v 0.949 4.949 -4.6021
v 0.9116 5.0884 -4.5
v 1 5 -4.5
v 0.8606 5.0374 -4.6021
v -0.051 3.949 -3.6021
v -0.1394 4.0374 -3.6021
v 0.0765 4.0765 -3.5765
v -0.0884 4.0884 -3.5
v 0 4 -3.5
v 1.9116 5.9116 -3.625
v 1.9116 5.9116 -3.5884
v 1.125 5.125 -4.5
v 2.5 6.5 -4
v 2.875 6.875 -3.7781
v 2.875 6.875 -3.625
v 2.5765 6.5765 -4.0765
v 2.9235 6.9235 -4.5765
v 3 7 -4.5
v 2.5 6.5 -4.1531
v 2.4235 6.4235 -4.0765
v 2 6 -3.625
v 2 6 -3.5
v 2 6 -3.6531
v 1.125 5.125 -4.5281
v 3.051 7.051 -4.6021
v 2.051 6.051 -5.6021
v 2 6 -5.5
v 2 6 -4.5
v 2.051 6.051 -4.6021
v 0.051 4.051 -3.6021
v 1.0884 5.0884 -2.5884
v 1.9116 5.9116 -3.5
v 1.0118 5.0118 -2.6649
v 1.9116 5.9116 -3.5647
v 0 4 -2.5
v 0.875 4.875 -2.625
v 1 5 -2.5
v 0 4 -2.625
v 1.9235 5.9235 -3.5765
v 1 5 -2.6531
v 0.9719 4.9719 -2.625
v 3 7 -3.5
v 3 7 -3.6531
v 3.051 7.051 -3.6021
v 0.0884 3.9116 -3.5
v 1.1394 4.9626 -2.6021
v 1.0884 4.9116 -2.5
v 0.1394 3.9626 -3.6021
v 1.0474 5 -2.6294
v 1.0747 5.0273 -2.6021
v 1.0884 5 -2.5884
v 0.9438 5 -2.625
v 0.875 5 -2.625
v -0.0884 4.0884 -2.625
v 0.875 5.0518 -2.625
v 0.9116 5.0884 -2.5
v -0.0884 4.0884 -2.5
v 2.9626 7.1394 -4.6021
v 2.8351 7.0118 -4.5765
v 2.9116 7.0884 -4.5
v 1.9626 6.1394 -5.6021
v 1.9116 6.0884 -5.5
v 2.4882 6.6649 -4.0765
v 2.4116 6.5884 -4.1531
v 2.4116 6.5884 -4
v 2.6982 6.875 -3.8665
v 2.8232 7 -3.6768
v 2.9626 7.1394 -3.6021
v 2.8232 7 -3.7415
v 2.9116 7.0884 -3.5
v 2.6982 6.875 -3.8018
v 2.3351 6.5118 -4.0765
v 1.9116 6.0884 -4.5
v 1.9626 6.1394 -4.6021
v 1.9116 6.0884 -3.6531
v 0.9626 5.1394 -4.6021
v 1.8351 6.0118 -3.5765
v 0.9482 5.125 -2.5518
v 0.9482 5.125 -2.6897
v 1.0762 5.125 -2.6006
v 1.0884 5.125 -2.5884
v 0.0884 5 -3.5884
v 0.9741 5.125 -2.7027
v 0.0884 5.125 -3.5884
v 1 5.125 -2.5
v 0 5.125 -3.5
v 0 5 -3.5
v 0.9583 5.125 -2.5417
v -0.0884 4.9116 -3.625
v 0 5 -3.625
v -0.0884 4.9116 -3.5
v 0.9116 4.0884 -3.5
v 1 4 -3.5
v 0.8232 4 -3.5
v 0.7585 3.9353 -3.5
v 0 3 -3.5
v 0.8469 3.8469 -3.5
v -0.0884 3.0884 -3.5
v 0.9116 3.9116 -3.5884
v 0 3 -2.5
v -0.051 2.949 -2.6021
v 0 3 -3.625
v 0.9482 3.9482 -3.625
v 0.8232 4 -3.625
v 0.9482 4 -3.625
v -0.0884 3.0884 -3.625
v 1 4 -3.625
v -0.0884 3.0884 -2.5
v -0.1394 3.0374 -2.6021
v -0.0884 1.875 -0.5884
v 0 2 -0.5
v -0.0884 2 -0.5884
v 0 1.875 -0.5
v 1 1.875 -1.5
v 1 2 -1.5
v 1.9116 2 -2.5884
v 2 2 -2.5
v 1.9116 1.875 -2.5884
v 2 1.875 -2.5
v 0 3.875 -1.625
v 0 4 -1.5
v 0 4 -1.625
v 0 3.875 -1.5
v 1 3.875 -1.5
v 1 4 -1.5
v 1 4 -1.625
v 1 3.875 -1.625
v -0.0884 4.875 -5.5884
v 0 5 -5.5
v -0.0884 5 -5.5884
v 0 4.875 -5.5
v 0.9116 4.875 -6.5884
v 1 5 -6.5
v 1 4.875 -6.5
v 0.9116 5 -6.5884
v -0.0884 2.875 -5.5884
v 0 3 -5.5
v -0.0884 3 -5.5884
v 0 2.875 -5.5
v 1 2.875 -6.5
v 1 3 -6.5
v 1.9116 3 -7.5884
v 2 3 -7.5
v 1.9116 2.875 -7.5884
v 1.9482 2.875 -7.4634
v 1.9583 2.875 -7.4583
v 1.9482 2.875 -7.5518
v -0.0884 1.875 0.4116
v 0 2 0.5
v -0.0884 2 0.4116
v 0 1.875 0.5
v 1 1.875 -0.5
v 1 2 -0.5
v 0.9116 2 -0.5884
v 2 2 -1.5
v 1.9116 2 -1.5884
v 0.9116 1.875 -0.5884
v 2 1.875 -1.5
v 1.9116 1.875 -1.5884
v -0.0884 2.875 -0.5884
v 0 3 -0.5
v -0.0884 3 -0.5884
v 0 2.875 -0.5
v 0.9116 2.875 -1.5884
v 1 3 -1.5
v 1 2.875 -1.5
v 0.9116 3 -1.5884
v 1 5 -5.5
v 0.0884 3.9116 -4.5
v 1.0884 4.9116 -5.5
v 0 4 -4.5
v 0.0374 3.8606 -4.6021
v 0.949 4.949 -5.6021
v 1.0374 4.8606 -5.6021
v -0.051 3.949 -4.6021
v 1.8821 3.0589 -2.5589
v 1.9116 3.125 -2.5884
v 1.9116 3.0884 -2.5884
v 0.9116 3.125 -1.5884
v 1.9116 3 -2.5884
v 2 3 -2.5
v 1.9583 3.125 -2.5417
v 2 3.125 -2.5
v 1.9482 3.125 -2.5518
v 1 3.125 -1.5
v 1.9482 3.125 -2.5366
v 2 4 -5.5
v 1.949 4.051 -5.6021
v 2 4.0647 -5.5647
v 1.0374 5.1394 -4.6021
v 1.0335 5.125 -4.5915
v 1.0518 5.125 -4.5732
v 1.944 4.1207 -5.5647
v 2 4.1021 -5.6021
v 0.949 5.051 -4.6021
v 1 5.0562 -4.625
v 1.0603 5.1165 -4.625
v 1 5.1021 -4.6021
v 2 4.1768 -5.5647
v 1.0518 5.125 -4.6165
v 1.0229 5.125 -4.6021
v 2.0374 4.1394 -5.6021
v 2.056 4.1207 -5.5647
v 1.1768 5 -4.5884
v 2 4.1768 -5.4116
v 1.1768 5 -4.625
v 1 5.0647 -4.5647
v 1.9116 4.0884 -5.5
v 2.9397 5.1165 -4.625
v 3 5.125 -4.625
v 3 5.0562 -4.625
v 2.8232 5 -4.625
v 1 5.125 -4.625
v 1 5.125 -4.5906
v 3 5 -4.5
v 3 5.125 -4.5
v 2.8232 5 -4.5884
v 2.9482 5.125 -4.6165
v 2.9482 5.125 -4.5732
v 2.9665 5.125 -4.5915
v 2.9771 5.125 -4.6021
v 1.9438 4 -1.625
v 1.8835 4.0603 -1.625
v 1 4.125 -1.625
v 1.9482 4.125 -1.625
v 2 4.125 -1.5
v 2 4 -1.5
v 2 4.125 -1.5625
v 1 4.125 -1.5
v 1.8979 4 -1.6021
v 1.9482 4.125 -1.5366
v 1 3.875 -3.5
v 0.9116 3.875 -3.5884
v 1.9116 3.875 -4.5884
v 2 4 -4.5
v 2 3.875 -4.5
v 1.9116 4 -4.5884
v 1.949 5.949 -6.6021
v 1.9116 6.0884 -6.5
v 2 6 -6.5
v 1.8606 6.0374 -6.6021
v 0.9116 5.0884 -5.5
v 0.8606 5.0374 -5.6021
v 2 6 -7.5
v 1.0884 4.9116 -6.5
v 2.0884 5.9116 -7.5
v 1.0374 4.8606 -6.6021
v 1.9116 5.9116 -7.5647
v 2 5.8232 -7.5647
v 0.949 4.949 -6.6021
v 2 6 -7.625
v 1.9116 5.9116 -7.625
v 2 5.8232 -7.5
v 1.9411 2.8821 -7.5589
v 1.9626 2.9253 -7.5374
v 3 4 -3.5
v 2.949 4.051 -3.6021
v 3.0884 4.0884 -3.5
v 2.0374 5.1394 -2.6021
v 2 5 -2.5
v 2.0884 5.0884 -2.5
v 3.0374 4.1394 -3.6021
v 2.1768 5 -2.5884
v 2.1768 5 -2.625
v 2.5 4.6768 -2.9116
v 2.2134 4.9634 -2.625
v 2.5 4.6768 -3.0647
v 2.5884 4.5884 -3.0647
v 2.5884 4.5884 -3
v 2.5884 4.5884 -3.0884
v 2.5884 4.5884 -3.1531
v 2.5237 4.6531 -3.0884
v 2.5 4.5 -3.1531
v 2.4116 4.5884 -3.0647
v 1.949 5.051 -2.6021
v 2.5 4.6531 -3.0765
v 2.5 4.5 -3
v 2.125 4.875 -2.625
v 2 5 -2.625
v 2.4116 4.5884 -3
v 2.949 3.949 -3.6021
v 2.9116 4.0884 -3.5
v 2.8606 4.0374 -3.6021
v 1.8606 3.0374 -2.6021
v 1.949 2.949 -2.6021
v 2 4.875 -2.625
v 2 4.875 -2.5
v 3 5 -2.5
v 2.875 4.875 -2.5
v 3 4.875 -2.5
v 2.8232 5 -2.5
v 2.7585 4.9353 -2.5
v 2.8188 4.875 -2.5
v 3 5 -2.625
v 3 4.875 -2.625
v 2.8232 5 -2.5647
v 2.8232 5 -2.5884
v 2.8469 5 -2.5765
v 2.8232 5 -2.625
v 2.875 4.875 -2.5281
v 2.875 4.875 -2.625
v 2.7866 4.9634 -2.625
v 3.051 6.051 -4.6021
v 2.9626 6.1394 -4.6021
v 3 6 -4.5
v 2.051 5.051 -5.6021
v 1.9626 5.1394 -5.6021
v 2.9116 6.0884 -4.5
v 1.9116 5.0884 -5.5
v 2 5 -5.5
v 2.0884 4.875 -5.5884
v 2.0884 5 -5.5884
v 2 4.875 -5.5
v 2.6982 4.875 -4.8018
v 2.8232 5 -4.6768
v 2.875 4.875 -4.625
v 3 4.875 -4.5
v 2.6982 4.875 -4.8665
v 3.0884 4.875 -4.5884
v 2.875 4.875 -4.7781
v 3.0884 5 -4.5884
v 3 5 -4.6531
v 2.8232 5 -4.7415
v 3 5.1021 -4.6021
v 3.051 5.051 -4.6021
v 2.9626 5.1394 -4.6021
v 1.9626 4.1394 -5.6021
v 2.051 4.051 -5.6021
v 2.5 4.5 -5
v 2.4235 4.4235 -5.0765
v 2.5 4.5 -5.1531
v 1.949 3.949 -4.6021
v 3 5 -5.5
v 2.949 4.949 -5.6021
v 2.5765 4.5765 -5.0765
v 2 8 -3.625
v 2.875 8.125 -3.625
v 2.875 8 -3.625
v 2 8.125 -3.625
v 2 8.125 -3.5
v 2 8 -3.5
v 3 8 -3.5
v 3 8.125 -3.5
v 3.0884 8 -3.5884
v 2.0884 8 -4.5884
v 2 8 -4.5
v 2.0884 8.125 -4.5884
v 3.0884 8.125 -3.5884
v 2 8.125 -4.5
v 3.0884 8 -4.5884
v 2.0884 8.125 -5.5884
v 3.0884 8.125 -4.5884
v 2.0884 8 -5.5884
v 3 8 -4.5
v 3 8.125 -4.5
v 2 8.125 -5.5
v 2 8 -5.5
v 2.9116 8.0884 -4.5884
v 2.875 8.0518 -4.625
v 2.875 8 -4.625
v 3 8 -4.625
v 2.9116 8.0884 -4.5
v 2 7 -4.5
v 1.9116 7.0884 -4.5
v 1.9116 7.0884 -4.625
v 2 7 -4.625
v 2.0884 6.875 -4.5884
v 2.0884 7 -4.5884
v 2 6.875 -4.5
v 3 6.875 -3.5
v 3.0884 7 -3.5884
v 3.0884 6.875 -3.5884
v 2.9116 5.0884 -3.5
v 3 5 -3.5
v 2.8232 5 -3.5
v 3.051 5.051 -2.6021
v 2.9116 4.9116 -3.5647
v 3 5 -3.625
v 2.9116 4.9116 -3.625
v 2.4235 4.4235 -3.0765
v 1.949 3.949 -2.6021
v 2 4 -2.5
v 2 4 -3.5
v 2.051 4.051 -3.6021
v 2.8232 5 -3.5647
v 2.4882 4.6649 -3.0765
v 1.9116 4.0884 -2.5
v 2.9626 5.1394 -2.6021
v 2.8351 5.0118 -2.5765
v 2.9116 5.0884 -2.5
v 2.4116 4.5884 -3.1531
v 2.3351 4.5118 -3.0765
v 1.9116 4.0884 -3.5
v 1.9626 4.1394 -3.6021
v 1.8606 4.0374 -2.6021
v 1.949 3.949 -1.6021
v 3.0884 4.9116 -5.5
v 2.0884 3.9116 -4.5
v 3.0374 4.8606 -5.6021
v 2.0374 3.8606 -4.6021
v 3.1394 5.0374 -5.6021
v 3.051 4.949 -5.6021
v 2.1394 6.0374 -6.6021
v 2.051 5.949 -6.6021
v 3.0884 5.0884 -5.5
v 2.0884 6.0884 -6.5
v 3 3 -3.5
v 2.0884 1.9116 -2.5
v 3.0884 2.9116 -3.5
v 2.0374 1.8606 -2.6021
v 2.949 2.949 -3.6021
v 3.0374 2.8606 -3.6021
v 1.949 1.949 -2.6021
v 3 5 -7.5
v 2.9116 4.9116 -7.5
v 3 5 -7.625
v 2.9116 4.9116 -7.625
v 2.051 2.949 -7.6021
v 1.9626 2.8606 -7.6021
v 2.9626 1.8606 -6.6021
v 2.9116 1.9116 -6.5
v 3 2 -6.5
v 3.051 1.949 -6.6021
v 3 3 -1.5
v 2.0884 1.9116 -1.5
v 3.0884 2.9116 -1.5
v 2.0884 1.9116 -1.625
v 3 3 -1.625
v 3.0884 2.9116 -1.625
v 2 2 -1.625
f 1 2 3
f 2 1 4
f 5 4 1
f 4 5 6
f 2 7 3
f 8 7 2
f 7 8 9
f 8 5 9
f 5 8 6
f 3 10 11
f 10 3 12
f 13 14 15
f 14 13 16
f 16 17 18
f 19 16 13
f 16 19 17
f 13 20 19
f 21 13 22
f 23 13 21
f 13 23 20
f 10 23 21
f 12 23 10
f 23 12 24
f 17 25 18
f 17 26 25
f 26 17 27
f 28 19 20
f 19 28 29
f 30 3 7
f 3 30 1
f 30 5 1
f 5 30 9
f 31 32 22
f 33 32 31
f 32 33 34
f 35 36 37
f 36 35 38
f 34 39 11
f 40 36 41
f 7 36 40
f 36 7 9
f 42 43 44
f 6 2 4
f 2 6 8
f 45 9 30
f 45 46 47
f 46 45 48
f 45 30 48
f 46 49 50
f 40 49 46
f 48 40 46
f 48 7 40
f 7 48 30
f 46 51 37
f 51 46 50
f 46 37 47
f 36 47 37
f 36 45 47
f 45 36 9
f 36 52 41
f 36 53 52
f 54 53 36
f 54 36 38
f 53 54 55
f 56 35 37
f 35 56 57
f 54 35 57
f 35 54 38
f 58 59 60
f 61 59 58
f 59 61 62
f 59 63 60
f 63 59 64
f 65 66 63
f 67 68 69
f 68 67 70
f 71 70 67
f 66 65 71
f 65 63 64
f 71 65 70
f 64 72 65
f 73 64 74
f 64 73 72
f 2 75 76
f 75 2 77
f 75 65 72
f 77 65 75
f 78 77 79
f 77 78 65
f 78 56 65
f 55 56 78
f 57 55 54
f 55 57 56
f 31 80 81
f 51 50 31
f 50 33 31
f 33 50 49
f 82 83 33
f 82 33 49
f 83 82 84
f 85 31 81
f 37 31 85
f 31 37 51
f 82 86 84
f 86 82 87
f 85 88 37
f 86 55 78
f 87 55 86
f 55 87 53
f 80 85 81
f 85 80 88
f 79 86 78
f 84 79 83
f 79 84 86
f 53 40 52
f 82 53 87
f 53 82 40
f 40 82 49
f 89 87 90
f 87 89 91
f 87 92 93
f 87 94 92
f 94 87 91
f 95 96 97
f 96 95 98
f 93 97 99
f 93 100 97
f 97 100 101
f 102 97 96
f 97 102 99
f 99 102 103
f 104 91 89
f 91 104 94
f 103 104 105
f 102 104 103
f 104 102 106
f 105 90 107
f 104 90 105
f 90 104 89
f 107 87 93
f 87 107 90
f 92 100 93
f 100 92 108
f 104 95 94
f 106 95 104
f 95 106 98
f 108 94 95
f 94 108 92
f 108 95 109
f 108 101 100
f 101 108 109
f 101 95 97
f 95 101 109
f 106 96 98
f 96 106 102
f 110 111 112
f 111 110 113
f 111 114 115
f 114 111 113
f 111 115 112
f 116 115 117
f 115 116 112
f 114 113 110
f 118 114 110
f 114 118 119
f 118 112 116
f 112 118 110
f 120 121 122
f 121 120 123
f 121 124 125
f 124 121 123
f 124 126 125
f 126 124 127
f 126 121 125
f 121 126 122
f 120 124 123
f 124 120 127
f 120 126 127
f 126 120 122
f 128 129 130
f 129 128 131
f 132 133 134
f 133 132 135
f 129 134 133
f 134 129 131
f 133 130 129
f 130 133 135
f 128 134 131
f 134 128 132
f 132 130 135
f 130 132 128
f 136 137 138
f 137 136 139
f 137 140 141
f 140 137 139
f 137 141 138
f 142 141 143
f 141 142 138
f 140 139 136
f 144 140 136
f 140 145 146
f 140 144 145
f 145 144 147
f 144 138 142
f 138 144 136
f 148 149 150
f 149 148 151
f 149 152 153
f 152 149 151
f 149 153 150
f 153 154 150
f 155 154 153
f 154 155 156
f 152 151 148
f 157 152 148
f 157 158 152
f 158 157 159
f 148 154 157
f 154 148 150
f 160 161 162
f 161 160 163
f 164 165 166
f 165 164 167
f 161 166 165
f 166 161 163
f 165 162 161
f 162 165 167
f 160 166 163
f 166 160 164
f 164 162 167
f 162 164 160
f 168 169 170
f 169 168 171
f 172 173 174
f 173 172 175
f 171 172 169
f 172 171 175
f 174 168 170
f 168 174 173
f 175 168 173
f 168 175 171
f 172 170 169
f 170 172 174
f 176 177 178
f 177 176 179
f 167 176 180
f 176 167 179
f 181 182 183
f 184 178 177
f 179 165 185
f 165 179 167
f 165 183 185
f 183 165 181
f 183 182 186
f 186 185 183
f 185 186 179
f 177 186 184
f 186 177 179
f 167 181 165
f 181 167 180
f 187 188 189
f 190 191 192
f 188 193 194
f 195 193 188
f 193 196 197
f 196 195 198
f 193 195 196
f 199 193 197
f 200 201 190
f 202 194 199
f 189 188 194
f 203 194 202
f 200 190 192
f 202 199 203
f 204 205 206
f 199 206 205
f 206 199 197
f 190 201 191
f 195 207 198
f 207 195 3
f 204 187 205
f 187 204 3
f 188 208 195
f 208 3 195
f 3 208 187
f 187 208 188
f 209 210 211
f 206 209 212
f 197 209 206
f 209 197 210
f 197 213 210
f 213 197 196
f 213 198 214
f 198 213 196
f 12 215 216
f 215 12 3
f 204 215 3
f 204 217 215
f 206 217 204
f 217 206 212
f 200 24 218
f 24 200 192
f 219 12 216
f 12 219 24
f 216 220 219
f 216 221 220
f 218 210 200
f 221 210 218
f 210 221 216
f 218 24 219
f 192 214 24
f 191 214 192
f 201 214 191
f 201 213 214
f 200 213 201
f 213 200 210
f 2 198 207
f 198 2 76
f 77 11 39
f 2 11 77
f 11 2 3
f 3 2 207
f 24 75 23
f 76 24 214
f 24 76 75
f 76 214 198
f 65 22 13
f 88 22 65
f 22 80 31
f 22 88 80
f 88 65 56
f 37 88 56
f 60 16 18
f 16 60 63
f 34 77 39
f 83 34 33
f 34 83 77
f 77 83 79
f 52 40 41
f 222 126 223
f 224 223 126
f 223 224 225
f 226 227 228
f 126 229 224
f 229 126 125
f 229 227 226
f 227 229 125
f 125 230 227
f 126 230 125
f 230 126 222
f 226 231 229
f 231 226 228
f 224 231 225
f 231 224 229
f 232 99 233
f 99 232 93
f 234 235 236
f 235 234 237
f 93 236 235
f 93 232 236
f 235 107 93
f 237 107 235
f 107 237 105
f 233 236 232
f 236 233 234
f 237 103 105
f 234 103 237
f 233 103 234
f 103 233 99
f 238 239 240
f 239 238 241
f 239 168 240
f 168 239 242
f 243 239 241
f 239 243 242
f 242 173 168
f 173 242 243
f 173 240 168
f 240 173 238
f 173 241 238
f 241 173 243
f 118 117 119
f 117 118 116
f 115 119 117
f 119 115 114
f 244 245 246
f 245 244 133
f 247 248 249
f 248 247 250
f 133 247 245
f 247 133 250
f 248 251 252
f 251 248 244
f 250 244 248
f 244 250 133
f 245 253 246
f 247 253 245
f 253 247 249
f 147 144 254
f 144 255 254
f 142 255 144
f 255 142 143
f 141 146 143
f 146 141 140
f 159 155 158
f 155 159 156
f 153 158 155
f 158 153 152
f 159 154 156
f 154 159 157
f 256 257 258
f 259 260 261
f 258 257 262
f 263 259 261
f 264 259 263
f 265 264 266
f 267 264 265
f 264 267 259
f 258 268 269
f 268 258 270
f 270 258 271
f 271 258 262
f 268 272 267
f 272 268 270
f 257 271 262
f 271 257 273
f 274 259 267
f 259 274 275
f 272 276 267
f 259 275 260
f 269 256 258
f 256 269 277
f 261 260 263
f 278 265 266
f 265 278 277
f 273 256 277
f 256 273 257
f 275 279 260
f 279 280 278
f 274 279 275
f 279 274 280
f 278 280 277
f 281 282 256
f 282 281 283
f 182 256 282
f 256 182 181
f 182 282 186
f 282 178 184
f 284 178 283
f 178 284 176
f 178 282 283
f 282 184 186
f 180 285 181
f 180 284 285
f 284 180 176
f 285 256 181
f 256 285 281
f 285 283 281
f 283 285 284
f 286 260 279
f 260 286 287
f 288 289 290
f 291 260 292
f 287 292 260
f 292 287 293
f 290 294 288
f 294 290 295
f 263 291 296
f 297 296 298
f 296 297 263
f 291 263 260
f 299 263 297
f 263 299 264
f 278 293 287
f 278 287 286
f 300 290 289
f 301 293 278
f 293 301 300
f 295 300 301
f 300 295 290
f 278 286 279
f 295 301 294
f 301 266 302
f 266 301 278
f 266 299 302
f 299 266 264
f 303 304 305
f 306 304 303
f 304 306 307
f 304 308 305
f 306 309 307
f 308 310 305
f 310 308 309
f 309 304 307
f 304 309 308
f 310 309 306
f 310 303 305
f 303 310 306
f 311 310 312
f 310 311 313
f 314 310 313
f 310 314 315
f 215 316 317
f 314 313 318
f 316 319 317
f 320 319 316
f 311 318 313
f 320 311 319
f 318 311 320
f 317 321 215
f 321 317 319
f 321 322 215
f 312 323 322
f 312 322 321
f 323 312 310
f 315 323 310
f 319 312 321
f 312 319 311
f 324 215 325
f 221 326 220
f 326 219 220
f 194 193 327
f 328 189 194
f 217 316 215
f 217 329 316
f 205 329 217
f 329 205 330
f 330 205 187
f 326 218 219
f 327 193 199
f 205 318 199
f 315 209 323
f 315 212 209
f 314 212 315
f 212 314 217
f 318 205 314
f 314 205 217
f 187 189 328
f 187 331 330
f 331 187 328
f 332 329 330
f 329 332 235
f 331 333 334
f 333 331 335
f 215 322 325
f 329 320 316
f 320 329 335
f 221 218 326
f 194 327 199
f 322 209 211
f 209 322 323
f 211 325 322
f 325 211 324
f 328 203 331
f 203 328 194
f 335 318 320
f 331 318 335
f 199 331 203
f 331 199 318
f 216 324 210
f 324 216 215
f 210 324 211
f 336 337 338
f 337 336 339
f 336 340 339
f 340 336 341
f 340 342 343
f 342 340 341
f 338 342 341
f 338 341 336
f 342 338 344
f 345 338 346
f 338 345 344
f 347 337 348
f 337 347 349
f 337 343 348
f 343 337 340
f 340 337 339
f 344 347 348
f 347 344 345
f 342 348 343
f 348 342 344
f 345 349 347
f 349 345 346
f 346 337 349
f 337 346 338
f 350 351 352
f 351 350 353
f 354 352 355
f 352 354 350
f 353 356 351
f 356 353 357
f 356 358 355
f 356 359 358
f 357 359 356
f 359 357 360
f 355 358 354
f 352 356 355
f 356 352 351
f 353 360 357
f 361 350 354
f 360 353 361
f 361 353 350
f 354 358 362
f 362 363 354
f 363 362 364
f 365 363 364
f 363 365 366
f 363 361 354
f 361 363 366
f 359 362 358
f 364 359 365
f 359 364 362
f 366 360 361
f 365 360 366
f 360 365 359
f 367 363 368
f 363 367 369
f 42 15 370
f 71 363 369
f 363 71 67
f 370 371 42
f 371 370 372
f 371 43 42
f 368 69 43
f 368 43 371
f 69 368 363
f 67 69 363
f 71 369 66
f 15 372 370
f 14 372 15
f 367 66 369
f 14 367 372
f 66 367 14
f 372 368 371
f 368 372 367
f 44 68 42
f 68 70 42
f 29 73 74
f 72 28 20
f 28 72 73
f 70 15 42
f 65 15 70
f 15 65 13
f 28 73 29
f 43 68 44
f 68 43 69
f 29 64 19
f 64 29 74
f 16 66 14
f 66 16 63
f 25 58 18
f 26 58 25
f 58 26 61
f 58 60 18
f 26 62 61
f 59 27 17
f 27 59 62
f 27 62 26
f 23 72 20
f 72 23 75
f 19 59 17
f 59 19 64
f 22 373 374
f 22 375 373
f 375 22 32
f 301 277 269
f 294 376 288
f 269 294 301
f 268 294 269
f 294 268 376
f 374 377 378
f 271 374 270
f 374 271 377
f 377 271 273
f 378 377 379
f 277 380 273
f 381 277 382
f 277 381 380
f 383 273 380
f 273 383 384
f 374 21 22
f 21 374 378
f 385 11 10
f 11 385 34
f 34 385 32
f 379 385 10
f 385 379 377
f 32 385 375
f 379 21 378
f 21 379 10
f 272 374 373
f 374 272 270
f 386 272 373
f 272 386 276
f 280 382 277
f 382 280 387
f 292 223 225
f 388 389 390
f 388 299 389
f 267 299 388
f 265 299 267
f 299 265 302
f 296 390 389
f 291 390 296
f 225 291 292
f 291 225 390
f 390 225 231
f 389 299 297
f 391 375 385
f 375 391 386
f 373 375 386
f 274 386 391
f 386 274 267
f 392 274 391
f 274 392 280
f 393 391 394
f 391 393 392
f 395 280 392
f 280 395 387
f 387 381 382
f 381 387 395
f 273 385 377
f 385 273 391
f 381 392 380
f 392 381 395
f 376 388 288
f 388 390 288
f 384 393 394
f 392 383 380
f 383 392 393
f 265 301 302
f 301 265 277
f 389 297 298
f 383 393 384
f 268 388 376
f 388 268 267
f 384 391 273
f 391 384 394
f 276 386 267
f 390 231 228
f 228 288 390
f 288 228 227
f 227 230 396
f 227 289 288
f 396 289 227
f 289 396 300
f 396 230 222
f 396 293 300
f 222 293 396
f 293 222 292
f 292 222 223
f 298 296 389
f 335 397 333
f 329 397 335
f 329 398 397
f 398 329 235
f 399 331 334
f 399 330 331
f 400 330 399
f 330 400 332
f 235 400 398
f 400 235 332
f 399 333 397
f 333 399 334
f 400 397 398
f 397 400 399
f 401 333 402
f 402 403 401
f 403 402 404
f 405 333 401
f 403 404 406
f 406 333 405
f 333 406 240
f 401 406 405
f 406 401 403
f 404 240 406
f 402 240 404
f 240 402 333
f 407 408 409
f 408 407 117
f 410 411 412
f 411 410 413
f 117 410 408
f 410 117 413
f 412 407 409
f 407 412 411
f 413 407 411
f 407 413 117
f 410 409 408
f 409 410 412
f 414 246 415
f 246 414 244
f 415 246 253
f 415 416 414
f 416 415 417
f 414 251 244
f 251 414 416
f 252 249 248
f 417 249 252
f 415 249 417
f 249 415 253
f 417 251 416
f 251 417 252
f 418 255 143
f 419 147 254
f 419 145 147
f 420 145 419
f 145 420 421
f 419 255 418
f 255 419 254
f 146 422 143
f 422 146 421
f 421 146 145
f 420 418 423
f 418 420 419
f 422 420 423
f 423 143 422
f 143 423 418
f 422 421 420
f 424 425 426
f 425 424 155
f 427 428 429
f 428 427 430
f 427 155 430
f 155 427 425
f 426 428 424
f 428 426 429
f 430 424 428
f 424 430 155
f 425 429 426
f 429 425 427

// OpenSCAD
translate(v = [-0.5, -0.5, 0]) {
	/*Shell 0*/
	union() {
		%/*Nodes shell 0*/
		union() {
			/*Node $_137*/
			color(alpha = 0.1, c = "orange") {
				translate(v = [0, 4, -4]) {
					cube(size = [1, 1, 1]);
				}
			}
			/*Node $_23*/
			color(alpha = 0.1, c = "orange") {
				translate(v = [0, 4, -3]) {
					cube(size = [1, 1, 1]);
				}
			}
			/*Node $_138*/
			color(alpha = 0.1, c = "pink") {
				translate(v = [0, 5, -4]) {
					cube(size = [1, 1, 1]);
				}
			}
			/*Node $_19*/
			color(alpha = 0.1, c = "yellow") {
				translate(v = [0, 3, -3]) {
					cube(size = [1, 1, 1]);
				}
			}
			/*Node $_41*/
			color(alpha = 0.1, c = "pink") {
				translate(v = [0, 3, -4]) {
					cube(size = [1, 1, 1]);
				}
			}
			/*Node $_37__0*/
			color(alpha = 0.1, c = "lightblue") {
				translate(v = [0, 2, -1]) {
					cube(size = [1, 1, 1]);
				}
			}
			/*Node $_39__0*/
			color(alpha = 0.1, c = "lightblue") {
				translate(v = [0, 4, -2]) {
					cube(size = [1, 1, 1]);
				}
			}
			/*Node $_42__0*/
			color(alpha = 0.1, c = "lightblue") {
				translate(v = [0, 5, -6]) {
					cube(size = [1, 1, 1]);
				}
			}
			/*Node $_36__0*/
			color(alpha = 0.1, c = "lightblue") {
				translate(v = [0, 3, -6]) {
					cube(size = [1, 1, 1]);
				}
			}
			/*Node $_40__0*/
			color(alpha = 0.1, c = "lightblue") {
				translate(v = [0, 2, 0]) {
					cube(size = [1, 1, 1]);
				}
			}
			/*Node $_38__0*/
			color(alpha = 0.1, c = "lightblue") {
				translate(v = [0, 3, -1]) {
					cube(size = [1, 1, 1]);
				}
			}
			/*Node $_43__0*/
			color(alpha = 0.1, c = "lightblue") {
				translate(v = [0, 4, -5]) {
					cube(size = [1, 1, 1]);
				}
			}
		}
		/*Edges shell 0*/
		union() {
			/*Edge 137 from thing.chamber[3].thingy.v8 to $_137*/
			translate(v = [0.5, 4.5, -3.5]) {
				rotate(a = [0, 125.26438968275465, 45.0]) {
					cube(size = [0.125, 0.125, 1.7320508075688772]);
				}
			}
			/*Edge 137 from $_137 to thing.chamber[3].thingy.v9*/
			translate(v = [1.5, 5.5, -2.5]) {
				rotate(a = [0, 125.26438968275465, -135.0]) {
					cube(size = [0.125, 0.125, 1.7320508075688772]);
				}
			}
			/*Edge 23 from thing.chamber[3].thingy.v9 to $_23*/
			translate(v = [0.5, 4.5, -2.5]) {
				rotate(a = [0, 90.0, 45.0]) {
					cube(size = [0.125, 0.125, 1.4142135623730951]);
				}
			}
			/*Edge 138 from thing.chamber[3].thingy.v9 to $_138*/
			translate(v = [0.5, 5.5, -3.5]) {
				rotate(a = [0, 45.00000000000001, 0.0]) {
					cube(size = [0.125, 0.125, 1.4142135623730951]);
				}
			}
			/*Edge 138 from $_138 to thing.dead_bead*/
			translate(v = [1.5, 4.5, -3.5]) {
				rotate(a = [0, 90.0, 135.0]) {
					cube(size = [0.125, 0.125, 1.4142135623730951]);
				}
			}
			/*Edge 19 from thing.dead_bead to $_19*/
			translate(v = [0.5, 3.5, -2.5]) {
				rotate(a = [0, 125.26438968275465, 45.0]) {
					cube(size = [0.125, 0.125, 1.7320508075688772]);
				}
			}
			/*Edge 41 from thing.dead_bead to $_41*/
			translate(v = [0.5, 3.5, -3.5]) {
				rotate(a = [0, 90.0, 45.0]) {
					cube(size = [0.125, 0.125, 1.4142135623730951]);
				}
			}
			/*Edge -1 from $_37__0 to $_37__1*/
			translate(v = [1.5, 2.5, -1.5]) {
				rotate(a = [0, 45.00000000000001, 180.0]) {
					cube(size = [0.125, 0.125, 1.4142135623730951]);
				}
			}
			/*Edge -1 from $_39__0 to $_39__1*/
			translate(v = [1.5, 4.5, -1.5]) {
				rotate(a = [0, 90.0, 180.0]) {
					cube(size = [0.125, 0.125, 1.0]);
				}
			}
			/*Edge -1 from $_42__0 to $_42__1*/
			translate(v = [1.5, 5.5, -6.5]) {
				rotate(a = [0, 45.00000000000001, 180.0]) {
					cube(size = [0.125, 0.125, 1.4142135623730951]);
				}
			}
			/*Edge -1 from $_36__0 to $_36__1*/
			translate(v = [1.5, 3.5, -6.5]) {
				rotate(a = [0, 45.00000000000001, 180.0]) {
					cube(size = [0.125, 0.125, 1.4142135623730951]);
				}
			}
			/*Edge -1 from $_40__0 to $_40__1*/
			translate(v = [1.5, 2.5, -0.5]) {
				rotate(a = [0, 45.00000000000001, 180.0]) {
					cube(size = [0.125, 0.125, 1.4142135623730951]);
				}
			}
			/*Edge -1 from $_38__0 to $_38__1*/
			translate(v = [1.5, 3.5, -1.5]) {
				rotate(a = [0, 45.00000000000001, 180.0]) {
					cube(size = [0.125, 0.125, 1.4142135623730951]);
				}
			}
			/*Edge -1 from $_43__0 to $_43__1*/
			translate(v = [1.5, 5.5, -5.5]) {
				rotate(a = [0, 54.735610317245346, -135.0]) {
					cube(size = [0.125, 0.125, 1.7320508075688772]);
				}
			}
		}
	}
	/*Shell 1*/
	union() {
		%/*Nodes shell 1*/
		union() {
			/*Node thing.chamber[3].thingy.v8*/
			color(alpha = 0.1, c = "black") {
				translate(v = [1, 5, -5]) {
					cube(size = [1, 1, 1]);
				}
			}
			/*Node thing.chamber[3].thingy.v9*/
			color(alpha = 0.1, c = "black") {
				translate(v = [1, 5, -3]) {
					cube(size = [1, 1, 1]);
				}
			}
			/*Node thing.dead_bead*/
			color(alpha = 0.1, c = "black") {
				translate(v = [1, 4, -4]) {
					cube(size = [1, 1, 1]);
				}
			}
			/*Node $_37__1*/
			color(alpha = 0.1, c = "lightblue") {
				translate(v = [1, 2, -2]) {
					cube(size = [1, 1, 1]);
				}
			}
			/*Node $_39__1*/
			color(alpha = 0.1, c = "lightblue") {
				translate(v = [1, 4, -2]) {
					cube(size = [1, 1, 1]);
				}
			}
			/*Node $_42__1*/
			color(alpha = 0.1, c = "lightblue") {
				translate(v = [1, 5, -7]) {
					cube(size = [1, 1, 1]);
				}
			}
			/*Node $_36__1*/
			color(alpha = 0.1, c = "lightblue") {
				translate(v = [1, 3, -7]) {
					cube(size = [1, 1, 1]);
				}
			}
			/*Node $_40__1*/
			color(alpha = 0.1, c = "lightblue") {
				translate(v = [1, 2, -1]) {
					cube(size = [1, 1, 1]);
				}
			}
			/*Node $_38__1*/
			color(alpha = 0.1, c = "lightblue") {
				translate(v = [1, 3, -2]) {
					cube(size = [1, 1, 1]);
				}
			}
			/*Node $_43__1*/
			color(alpha = 0.1, c = "lightblue") {
				translate(v = [1, 5, -6]) {
					cube(size = [1, 1, 1]);
				}
			}
		}
		/*Edges shell 1*/
		union() {
			/*Edge -1 from $_38 to $_38__1*/
			translate(v = [1.5, 3.5, -1.5]) {
				rotate(a = [0, 135.0, 0.0]) {
					cube(size = [0.125, 0.125, 1.4142135623730951]);
				}
			}
			/*Edge 121 from $_121 to thing.chamber[3].thingy.v8*/
			translate(v = [1.5, 5.5, -4.5]) {
				rotate(a = [0, 125.26438968275465, -45.0]) {
					cube(size = [0.125, 0.125, 1.7320508075688772]);
				}
			}
			/*Edge 122 from $_122 to thing.chamber[3].thingy.v8*/
			translate(v = [1.5, 5.5, -4.5]) {
				rotate(a = [0, 90.0, 0.0]) {
					cube(size = [0.125, 0.125, 1.0]);
				}
			}
			/*Edge 128 from $_128 to thing.chamber[3].thingy.v8*/
			translate(v = [1.5, 5.5, -4.5]) {
				rotate(a = [0, 54.735610317245346, 45.0]) {
					cube(size = [0.125, 0.125, 1.7320508075688772]);
				}
			}
			/*Edge 128 from $_128 to thing.chamber[3].thingy.v9*/
			translate(v = [1.5, 5.5, -2.5]) {
				rotate(a = [0, 125.26438968275465, 45.0]) {
					cube(size = [0.125, 0.125, 1.7320508075688772]);
				}
			}
			/*Edge -1 from $_39 to $_39__1*/
			translate(v = [1.5, 4.5, -1.5]) {
				rotate(a = [0, 90.0, 0.0]) {
					cube(size = [0.125, 0.125, 1.0]);
				}
			}
			/*Edge 139 from thing.dead_bead to $_139*/
			translate(v = [2.5, 4.5, -4.5]) {
				rotate(a = [0, 45.00000000000001, 180.0]) {
					cube(size = [0.125, 0.125, 1.4142135623730951]);
				}
			}
			/*Edge -1 from $_43 to $_43__1*/
			translate(v = [1.5, 5.5, -5.5]) {
				rotate(a = [0, 125.26438968275465, 45.0]) {
					cube(size = [0.125, 0.125, 1.7320508075688772]);
				}
			}
			/*Edge -1 from $_37__1 to $_37__2*/
			translate(v = [2.5, 2.5, -2.5]) {
				rotate(a = [0, 45.00000000000001, 180.0]) {
					cube(size = [0.125, 0.125, 1.4142135623730951]);
				}
			}
			/*Edge -1 from $_42__1 to $_42__2*/
			translate(v = [2.5, 6.5, -7.5]) {
				rotate(a = [0, 54.735610317245346, -135.0]) {
					cube(size = [0.125, 0.125, 1.7320508075688772]);
				}
			}
			/*Edge -1 from $_36__1 to $_36__2*/
			translate(v = [2.5, 3.5, -7.5]) {
				rotate(a = [0, 45.00000000000001, 180.0]) {
					cube(size = [0.125, 0.125, 1.4142135623730951]);
				}
			}
			/*Edge -1 from $_40__1 to $_40__2*/
			translate(v = [2.5, 2.5, -1.5]) {
				rotate(a = [0, 45.00000000000001, 180.0]) {
					cube(size = [0.125, 0.125, 1.4142135623730951]);
				}
			}
		}
	}
	/*Shell 2*/
	union() {
		%/*Nodes shell 2*/
		union() {
			/*Node $_110*/
			color(alpha = 0.1, c = "yellow") {
				translate(v = [2, 5, -3]) {
					cube(size = [1, 1, 1]);
				}
			}
			/*Node $_38*/
			color(alpha = 0.1, c = "pink") {
				translate(v = [2, 3, -3]) {
					cube(size = [1, 1, 1]);
				}
			}
			/*Node $_120*/
			color(alpha = 0.1, c = "orange") {
				translate(v = [2, 5, -6]) {
					cube(size = [1, 1, 1]);
				}
			}
			/*Node $_121*/
			color(alpha = 0.1, c = "orange") {
				translate(v = [2, 4, -6]) {
					cube(size = [1, 1, 1]);
				}
			}
			/*Node $_122*/
			color(alpha = 0.1, c = "pink") {
				translate(v = [2, 5, -5]) {
					cube(size = [1, 1, 1]);
				}
			}
			/*Node $_27*/
			color(alpha = 0.1, c = "yellow") {
				translate(v = [2, 8, -4]) {
					cube(size = [1, 1, 1]);
				}
			}
			/*Node $_124*/
			color(alpha = 0.1, c = "pink") {
				translate(v = [2, 8, -5]) {
					cube(size = [1, 1, 1]);
				}
			}
			/*Node $_28*/
			color(alpha = 0.1, c = "yellow") {
				translate(v = [2, 8, -6]) {
					cube(size = [1, 1, 1]);
				}
			}
			/*Node $_125*/
			color(alpha = 0.1, c = "pink") {
				translate(v = [2, 7, -5]) {
					cube(size = [1, 1, 1]);
				}
			}
			/*Node $_29*/
			color(alpha = 0.1, c = "yellow") {
				translate(v = [2, 6, -5]) {
					cube(size = [1, 1, 1]);
				}
			}
			/*Node $_24*/
			color(alpha = 0.1, c = "yellow") {
				translate(v = [2, 6, -6]) {
					cube(size = [1, 1, 1]);
				}
			}
			/*Node $_128*/
			color(alpha = 0.1, c = "pink") {
				translate(v = [2, 6, -4]) {
					cube(size = [1, 1, 1]);
				}
			}
			/*Node $_25*/
			color(alpha = 0.1, c = "orange") {
				translate(v = [2, 4, -3]) {
					cube(size = [1, 1, 1]);
				}
			}
			/*Node $_26*/
			color(alpha = 0.1, c = "yellow") {
				translate(v = [2, 4, -4]) {
					cube(size = [1, 1, 1]);
				}
			}
			/*Node $_39*/
			color(alpha = 0.1, c = "pink") {
				translate(v = [2, 4, -2]) {
					cube(size = [1, 1, 1]);
				}
			}
			/*Node $_139*/
			color(alpha = 0.1, c = "orange") {
				translate(v = [2, 4, -5]) {
					cube(size = [1, 1, 1]);
				}
			}
			/*Node $_43*/
			color(alpha = 0.1, c = "pink") {
				translate(v = [2, 6, -7]) {
					cube(size = [1, 1, 1]);
				}
			}
			/*Node $_37__2*/
			color(alpha = 0.1, c = "lightblue") {
				translate(v = [2, 2, -3]) {
					cube(size = [1, 1, 1]);
				}
			}
			/*Node $_42__2*/
			color(alpha = 0.1, c = "lightblue") {
				translate(v = [2, 6, -8]) {
					cube(size = [1, 1, 1]);
				}
			}
			/*Node $_36__2*/
			color(alpha = 0.1, c = "lightblue") {
				translate(v = [2, 3, -8]) {
					cube(size = [1, 1, 1]);
				}
			}
			/*Node $_40__2*/
			color(alpha = 0.1, c = "lightblue") {
				translate(v = [2, 2, -2]) {
					cube(size = [1, 1, 1]);
				}
			}
		}
		/*Edges shell 2*/
		union() {
			/*Edge 110 from thing.chamber[2].thingy.v13 to $_110*/
			translate(v = [2.5, 5.5, -2.5]) {
				rotate(a = [0, 125.26438968275465, -45.0]) {
					cube(size = [0.125, 0.125, 1.7320508075688772]);
				}
			}
			/*Edge 38 from thing.chamber[2].thingy.v13 to $_38*/
			translate(v = [2.5, 3.5, -2.5]) {
				rotate(a = [0, 125.26438968275465, 45.0]) {
					cube(size = [0.125, 0.125, 1.7320508075688772]);
				}
			}
			/*Edge 110 from $_110 to thing.chamber[3].thingy.v13*/
			translate(v = [3.5, 5.5, -2.5]) {
				rotate(a = [0, 90.0, 180.0]) {
					cube(size = [0.125, 0.125, 1.0]);
				}
			}
			/*Edge 120 from thing.chamber[2].thingy.v8 to $_120*/
			translate(v = [2.5, 5.5, -5.5]) {
				rotate(a = [0, 54.735610317245346, 45.0]) {
					cube(size = [0.125, 0.125, 1.7320508075688772]);
				}
			}
			/*Edge 120 from $_120 to thing.chamber[2].thingy.v9*/
			translate(v = [3.5, 5.5, -4.5]) {
				rotate(a = [0, 135.0, 180.0]) {
					cube(size = [0.125, 0.125, 1.4142135623730951]);
				}
			}
			/*Edge 121 from thing.chamber[2].thingy.v9 to $_121*/
			translate(v = [2.5, 4.5, -5.5]) {
				rotate(a = [0, 54.735610317245346, 45.0]) {
					cube(size = [0.125, 0.125, 1.7320508075688772]);
				}
			}
			/*Edge 122 from thing.chamber[2].thingy.v9 to $_122*/
			translate(v = [2.5, 5.5, -4.5]) {
				rotate(a = [0, 90.0, 0.0]) {
					cube(size = [0.125, 0.125, 1.0]);
				}
			}
			/*Edge 27 from thing.chamber[3].thingy.p0 to $_27*/
			translate(v = [2.5, 8.5, -3.5]) {
				rotate(a = [0, 90.0, 0.0]) {
					cube(size = [0.125, 0.125, 1.0]);
				}
			}
			/*Edge 124 from thing.chamber[3].thingy.p0 to $_124*/
			translate(v = [2.5, 8.5, -4.5]) {
				rotate(a = [0, 45.00000000000001, 0.0]) {
					cube(size = [0.125, 0.125, 1.4142135623730951]);
				}
			}
			/*Edge 28 from thing.chamber[3].thingy.p1 to $_28*/
			translate(v = [2.5, 8.5, -5.5]) {
				rotate(a = [0, 45.00000000000001, 0.0]) {
					cube(size = [0.125, 0.125, 1.4142135623730951]);
				}
			}
			/*Edge 125 from thing.chamber[3].thingy.p1 to $_125*/
			translate(v = [2.5, 7.5, -4.5]) {
				rotate(a = [0, 90.0, 45.0]) {
					cube(size = [0.125, 0.125, 1.4142135623730951]);
				}
			}
			/*Edge 125 from $_125 to thing.chamber[3].thingy.p2*/
			translate(v = [3.5, 7.5, -3.5]) {
				rotate(a = [0, 135.0, 180.0]) {
					cube(size = [0.125, 0.125, 1.4142135623730951]);
				}
			}
			/*Edge 29 from thing.chamber[3].thingy.p2 to $_29*/
			translate(v = [2.5, 6.5, -4.5]) {
				rotate(a = [0, 54.735610317245346, 45.0]) {
					cube(size = [0.125, 0.125, 1.7320508075688772]);
				}
			}
			/*Edge 24 from thing.chamber[3].thingy.v10 to $_24*/
			translate(v = [2.5, 6.5, -5.5]) {
				rotate(a = [0, 54.735610317245346, 45.0]) {
					cube(size = [0.125, 0.125, 1.7320508075688772]);
				}
			}
			/*Edge 128 from thing.chamber[3].thingy.v10 to $_128*/
			translate(v = [2.5, 6.5, -3.5]) {
				rotate(a = [0, 125.26438968275465, 45.0]) {
					cube(size = [0.125, 0.125, 1.7320508075688772]);
				}
			}
			/*Edge 128 from $_128 to thing.chamber[3].thingy.v11*/
			translate(v = [3.5, 5.5, -3.5]) {
				rotate(a = [0, 90.0, 135.0]) {
					cube(size = [0.125, 0.125, 1.4142135623730951]);
				}
			}
			/*Edge 25 from thing.chamber[3].thingy.v11 to $_25*/
			translate(v = [2.5, 4.5, -2.5]) {
				rotate(a = [0, 125.26438968275465, 45.0]) {
					cube(size = [0.125, 0.125, 1.7320508075688772]);
				}
			}
			/*Edge 26 from thing.chamber[3].thingy.v13 to $_26*/
			translate(v = [2.5, 4.5, -3.5]) {
				rotate(a = [0, 54.735610317245346, 45.0]) {
					cube(size = [0.125, 0.125, 1.7320508075688772]);
				}
			}
			/*Edge 39 from thing.chamber[3].thingy.v13 to $_39*/
			translate(v = [2.5, 4.5, -1.5]) {
				rotate(a = [0, 125.26438968275465, 45.0]) {
					cube(size = [0.125, 0.125, 1.7320508075688772]);
				}
			}
			/*Edge 139 from $_139 to thing.dead_cell*/
			translate(v = [3.5, 5.5, -5.5]) {
				rotate(a = [0, 54.735610317245346, -135.0]) {
					cube(size = [0.125, 0.125, 1.7320508075688772]);
				}
			}
			/*Edge 43 from thing.dead_cell to $_43*/
			translate(v = [2.5, 6.5, -6.5]) {
				rotate(a = [0, 54.735610317245346, -45.0]) {
					cube(size = [0.125, 0.125, 1.7320508075688772]);
				}
			}
			/*Edge -1 from $_37__2 to $_37__3*/
			translate(v = [3.5, 3.5, -3.5]) {
				rotate(a = [0, 54.735610317245346, -135.0]) {
					cube(size = [0.125, 0.125, 1.7320508075688772]);
				}
			}
			/*Edge -1 from $_42__2 to $_42__3*/
			translate(v = [3.5, 5.5, -7.5]) {
				rotate(a = [0, 90.0, 135.0]) {
					cube(size = [0.125, 0.125, 1.4142135623730951]);
				}
			}
			/*Edge -1 from $_36__2 to $_36__3*/
			translate(v = [3.5, 2.5, -6.5]) {
				rotate(a = [0, 125.26438968275465, 135.0]) {
					cube(size = [0.125, 0.125, 1.7320508075688772]);
				}
			}
			/*Edge -1 from $_40__2 to $_40__3*/
			translate(v = [3.5, 3.5, -1.5]) {
				rotate(a = [0, 90.0, -135.0]) {
					cube(size = [0.125, 0.125, 1.4142135623730951]);
				}
			}
		}
	}
	/*Shell 3*/
	union() {
		%/*Nodes shell 3*/
		union() {
			/*Node thing.chamber[2].thingy.v13*/
			color(alpha = 0.1, c = "black") {
				translate(v = [3, 4, -4]) {
					cube(size = [1, 1, 1]);
				}
			}
			/*Node thing.chamber[2].thingy.v8*/
			color(alpha = 0.1, c = "black") {
				translate(v = [3, 6, -5]) {
					cube(size = [1, 1, 1]);
				}
			}
			/*Node thing.chamber[2].thingy.v9*/
			color(alpha = 0.1, c = "black") {
				translate(v = [3, 5, -5]) {
					cube(size = [1, 1, 1]);
				}
			}
			/*Node thing.chamber[3].thingy.p0*/
			color(alpha = 0.1, c = "black") {
				translate(v = [3, 8, -4]) {
					cube(size = [1, 1, 1]);
				}
			}
			/*Node thing.chamber[3].thingy.p1*/
			color(alpha = 0.1, c = "black") {
				translate(v = [3, 8, -5]) {
					cube(size = [1, 1, 1]);
				}
			}
			/*Node thing.chamber[3].thingy.p2*/
			color(alpha = 0.1, c = "black") {
				translate(v = [3, 7, -4]) {
					cube(size = [1, 1, 1]);
				}
			}
			/*Node thing.chamber[3].thingy.v10*/
			color(alpha = 0.1, c = "black") {
				translate(v = [3, 7, -5]) {
					cube(size = [1, 1, 1]);
				}
			}
			/*Node thing.chamber[3].thingy.v11*/
			color(alpha = 0.1, c = "black") {
				translate(v = [3, 5, -4]) {
					cube(size = [1, 1, 1]);
				}
			}
			/*Node thing.chamber[3].thingy.v13*/
			color(alpha = 0.1, c = "black") {
				translate(v = [3, 5, -3]) {
					cube(size = [1, 1, 1]);
				}
			}
			/*Node thing.dead_cell*/
			color(alpha = 0.1, c = "black") {
				translate(v = [3, 5, -6]) {
					cube(size = [1, 1, 1]);
				}
			}
			/*Node $_37__3*/
			color(alpha = 0.1, c = "lightblue") {
				translate(v = [3, 3, -4]) {
					cube(size = [1, 1, 1]);
				}
			}
			/*Node $_42__3*/
			color(alpha = 0.1, c = "lightblue") {
				translate(v = [3, 5, -8]) {
					cube(size = [1, 1, 1]);
				}
			}
			/*Node $_36__3*/
			color(alpha = 0.1, c = "lightblue") {
				translate(v = [3, 2, -7]) {
					cube(size = [1, 1, 1]);
				}
			}
			/*Node $_40__3*/
			color(alpha = 0.1, c = "lightblue") {
				translate(v = [3, 3, -2]) {
					cube(size = [1, 1, 1]);
				}
			}
		}
		/*Edges shell 3*/
		union();
	}
	/*Shell 4*/
	union() {
		%/*Nodes shell 4*/
		union();
		/*Edges shell 4*/
		union();
	}
	/*Shell 5*/
	union() {
		%/*Nodes shell 5*/
		union();
		/*Edges shell 5*/
		union();
	}
	/*Shell 6*/
	union() {
		%/*Nodes shell 6*/
		union();
		/*Edges shell 6*/
		union();
	}
	/*Shell 7*/
	union() {
		%/*Nodes shell 7*/
		union();
		/*Edges shell 7*/
		union();
	}
	/*Shell 8*/
	union() {
		%/*Nodes shell 8*/
		union();
		/*Edges shell 8*/
		union();
	}
	/*Shell 9*/
	union() {
		%/*Nodes shell 9*/
		union();
		/*Edges shell 9*/
		union();
	}
	/*Shell 10*/
	union() {
		%/*Nodes shell 10*/
		union();
		/*Edges shell 10*/
		union();
	}
	/*Shell 11*/
	union() {
		%/*Nodes shell 11*/
		union();
		/*Edges shell 11*/
		union();
	}
	/*Shell 12*/
	union() {
		%/*Nodes shell 12*/
		union();
		/*Edges shell 12*/
		union();
	}
}
